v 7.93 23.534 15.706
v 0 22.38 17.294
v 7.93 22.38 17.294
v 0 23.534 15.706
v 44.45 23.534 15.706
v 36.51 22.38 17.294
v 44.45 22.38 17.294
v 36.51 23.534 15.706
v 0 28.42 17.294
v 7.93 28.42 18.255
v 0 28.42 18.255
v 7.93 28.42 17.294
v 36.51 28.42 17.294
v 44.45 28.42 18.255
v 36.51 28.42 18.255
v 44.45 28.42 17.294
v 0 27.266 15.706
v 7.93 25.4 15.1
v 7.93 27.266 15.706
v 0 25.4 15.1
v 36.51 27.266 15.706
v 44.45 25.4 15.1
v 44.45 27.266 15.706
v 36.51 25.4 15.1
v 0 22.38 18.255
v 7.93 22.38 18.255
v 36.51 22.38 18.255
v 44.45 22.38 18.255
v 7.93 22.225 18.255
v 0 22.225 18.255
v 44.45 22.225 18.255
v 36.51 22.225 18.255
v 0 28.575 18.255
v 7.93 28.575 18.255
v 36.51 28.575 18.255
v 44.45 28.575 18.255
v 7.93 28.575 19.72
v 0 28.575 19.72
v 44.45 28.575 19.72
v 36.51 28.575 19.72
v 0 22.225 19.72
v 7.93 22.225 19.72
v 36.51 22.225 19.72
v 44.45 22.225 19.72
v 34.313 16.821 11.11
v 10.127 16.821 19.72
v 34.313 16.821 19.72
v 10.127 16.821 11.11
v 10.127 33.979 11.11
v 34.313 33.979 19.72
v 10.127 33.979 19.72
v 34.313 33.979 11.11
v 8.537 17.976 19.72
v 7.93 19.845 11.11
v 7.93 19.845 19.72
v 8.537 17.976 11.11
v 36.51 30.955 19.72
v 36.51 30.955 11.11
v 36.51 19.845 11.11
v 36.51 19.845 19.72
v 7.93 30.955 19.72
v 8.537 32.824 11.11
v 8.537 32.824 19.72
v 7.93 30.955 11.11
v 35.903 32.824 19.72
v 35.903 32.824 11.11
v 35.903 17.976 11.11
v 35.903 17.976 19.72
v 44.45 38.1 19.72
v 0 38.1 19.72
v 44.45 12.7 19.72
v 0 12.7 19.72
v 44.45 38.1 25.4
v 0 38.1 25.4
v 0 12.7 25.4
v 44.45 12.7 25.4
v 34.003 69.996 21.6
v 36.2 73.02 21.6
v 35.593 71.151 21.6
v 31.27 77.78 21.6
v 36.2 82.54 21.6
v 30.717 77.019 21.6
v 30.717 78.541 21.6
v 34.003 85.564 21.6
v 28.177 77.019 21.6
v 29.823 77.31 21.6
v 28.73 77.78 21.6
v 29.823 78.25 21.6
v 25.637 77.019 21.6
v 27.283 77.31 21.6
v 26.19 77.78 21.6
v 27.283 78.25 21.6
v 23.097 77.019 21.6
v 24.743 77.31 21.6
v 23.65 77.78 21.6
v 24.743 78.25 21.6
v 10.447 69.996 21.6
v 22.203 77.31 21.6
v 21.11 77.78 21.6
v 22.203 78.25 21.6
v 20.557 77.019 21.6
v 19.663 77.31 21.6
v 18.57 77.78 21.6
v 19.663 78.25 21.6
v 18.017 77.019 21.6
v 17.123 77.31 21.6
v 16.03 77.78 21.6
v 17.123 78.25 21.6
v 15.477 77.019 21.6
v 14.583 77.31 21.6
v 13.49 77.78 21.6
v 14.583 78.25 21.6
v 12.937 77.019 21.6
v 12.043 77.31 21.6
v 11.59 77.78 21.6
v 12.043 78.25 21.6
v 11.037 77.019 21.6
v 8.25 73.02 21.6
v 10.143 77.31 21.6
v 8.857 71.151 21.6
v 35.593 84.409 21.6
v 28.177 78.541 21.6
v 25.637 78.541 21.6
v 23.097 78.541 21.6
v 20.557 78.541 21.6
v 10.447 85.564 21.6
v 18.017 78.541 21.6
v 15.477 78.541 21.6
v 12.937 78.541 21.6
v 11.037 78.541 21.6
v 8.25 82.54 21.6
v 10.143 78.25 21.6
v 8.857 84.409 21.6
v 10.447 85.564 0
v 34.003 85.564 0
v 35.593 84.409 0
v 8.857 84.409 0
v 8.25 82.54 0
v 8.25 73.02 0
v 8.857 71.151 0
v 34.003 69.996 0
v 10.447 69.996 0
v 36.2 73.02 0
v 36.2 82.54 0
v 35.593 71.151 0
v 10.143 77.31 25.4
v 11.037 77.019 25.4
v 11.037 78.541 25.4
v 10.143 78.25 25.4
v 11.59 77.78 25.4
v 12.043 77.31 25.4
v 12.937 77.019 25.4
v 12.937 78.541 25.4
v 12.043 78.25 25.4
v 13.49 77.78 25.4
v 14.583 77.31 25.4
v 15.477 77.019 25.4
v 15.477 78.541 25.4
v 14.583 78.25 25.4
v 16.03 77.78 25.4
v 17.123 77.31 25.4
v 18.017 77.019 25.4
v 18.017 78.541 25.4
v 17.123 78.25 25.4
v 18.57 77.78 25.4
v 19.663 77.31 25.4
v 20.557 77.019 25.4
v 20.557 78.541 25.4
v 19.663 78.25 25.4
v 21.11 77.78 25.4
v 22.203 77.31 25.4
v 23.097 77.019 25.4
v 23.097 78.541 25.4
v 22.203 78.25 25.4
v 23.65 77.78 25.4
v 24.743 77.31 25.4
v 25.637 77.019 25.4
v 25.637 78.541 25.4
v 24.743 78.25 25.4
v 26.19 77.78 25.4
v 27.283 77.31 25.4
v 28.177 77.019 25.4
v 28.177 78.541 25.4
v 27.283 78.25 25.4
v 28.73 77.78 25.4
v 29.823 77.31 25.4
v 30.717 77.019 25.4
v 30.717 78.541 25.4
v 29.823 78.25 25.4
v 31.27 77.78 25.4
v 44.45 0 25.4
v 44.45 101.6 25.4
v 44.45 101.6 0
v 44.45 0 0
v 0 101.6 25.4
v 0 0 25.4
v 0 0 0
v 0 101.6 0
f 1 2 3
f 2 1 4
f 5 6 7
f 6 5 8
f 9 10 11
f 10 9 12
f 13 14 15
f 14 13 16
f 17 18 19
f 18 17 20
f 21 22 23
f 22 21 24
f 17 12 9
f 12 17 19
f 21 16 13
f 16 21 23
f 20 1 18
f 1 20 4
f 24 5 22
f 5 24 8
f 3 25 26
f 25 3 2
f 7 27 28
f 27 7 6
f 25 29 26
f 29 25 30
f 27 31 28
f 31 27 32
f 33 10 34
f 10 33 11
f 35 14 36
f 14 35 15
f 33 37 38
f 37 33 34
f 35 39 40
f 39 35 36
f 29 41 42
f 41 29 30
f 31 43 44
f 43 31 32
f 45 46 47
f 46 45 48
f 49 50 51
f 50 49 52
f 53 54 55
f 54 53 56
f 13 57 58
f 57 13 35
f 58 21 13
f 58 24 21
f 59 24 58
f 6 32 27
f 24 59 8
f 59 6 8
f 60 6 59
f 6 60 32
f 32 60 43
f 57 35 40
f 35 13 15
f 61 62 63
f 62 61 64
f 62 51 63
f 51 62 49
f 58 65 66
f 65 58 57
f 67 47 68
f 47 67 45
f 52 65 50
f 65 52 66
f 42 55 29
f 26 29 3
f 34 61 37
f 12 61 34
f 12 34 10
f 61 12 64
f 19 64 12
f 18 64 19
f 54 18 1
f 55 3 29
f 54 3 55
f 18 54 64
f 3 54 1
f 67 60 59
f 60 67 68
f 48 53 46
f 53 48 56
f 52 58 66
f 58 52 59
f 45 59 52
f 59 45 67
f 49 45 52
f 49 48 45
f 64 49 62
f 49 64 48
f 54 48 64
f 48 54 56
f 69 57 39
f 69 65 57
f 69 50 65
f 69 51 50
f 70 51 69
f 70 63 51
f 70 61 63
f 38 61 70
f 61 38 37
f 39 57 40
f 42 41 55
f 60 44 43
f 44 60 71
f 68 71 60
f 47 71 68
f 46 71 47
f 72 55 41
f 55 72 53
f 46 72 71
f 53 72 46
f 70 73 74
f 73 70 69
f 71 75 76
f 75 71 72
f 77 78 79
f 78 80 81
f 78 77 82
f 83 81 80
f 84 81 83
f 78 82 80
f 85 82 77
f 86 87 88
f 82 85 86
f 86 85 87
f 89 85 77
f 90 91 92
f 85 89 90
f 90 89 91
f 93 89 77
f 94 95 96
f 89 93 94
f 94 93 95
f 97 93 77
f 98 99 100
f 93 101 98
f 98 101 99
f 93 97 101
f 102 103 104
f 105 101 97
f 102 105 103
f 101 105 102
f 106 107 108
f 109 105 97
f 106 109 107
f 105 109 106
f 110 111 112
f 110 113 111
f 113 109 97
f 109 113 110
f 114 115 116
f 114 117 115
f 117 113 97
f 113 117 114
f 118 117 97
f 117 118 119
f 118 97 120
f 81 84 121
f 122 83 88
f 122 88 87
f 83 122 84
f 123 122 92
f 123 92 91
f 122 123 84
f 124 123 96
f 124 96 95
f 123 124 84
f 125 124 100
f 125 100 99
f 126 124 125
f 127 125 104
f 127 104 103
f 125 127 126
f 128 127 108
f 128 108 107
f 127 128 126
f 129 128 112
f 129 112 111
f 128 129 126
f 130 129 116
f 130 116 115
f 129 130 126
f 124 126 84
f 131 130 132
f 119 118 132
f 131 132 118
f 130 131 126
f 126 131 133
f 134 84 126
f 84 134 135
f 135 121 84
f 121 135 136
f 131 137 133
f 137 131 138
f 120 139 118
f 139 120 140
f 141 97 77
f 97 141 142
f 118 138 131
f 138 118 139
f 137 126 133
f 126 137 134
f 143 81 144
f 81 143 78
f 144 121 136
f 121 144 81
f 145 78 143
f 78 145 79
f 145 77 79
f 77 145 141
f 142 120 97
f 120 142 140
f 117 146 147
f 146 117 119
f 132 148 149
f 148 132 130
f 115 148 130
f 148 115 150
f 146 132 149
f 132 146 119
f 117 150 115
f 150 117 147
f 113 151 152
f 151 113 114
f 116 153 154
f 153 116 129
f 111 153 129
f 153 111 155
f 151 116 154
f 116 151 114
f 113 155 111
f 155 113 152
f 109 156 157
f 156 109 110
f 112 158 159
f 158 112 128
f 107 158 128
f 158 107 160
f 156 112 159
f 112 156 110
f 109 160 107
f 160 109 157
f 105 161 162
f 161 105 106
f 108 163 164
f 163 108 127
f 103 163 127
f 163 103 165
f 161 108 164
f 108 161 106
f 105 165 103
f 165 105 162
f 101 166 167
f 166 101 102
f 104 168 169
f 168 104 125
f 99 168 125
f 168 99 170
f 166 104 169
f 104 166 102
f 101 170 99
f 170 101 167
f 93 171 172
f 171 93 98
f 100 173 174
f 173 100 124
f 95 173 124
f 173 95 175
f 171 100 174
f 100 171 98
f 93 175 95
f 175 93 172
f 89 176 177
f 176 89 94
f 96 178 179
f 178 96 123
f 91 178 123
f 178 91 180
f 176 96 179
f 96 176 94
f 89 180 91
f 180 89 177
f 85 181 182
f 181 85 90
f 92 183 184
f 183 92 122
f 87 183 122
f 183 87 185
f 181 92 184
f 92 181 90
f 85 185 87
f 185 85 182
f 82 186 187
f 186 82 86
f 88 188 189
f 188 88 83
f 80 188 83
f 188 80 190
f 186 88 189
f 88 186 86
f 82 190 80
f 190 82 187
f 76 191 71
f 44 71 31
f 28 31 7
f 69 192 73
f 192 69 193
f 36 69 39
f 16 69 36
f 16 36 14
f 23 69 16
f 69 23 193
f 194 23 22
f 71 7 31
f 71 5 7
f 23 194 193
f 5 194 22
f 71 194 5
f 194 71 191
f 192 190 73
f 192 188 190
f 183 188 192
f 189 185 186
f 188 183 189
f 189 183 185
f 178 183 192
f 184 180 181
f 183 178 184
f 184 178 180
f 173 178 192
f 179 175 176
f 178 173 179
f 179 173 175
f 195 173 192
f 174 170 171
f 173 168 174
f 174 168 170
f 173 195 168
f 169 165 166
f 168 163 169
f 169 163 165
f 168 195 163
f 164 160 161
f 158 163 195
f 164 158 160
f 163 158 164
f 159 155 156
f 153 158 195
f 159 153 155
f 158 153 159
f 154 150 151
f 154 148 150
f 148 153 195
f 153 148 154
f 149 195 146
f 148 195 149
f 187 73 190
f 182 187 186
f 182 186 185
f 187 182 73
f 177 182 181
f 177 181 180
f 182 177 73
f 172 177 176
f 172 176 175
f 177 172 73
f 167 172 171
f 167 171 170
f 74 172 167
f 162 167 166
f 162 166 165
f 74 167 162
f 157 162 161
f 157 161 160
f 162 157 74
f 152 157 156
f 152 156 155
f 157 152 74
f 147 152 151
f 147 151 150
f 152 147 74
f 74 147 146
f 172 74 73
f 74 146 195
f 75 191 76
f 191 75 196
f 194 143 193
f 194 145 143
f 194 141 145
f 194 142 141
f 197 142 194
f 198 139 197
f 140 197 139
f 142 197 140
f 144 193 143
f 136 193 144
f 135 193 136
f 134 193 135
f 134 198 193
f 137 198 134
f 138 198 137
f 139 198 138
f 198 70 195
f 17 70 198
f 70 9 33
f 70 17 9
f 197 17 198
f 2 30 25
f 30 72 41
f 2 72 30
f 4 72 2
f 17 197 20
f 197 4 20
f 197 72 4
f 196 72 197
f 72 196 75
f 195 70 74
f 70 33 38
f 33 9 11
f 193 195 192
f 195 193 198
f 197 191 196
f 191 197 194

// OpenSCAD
difference(){
    cube([44.45,101.6,25.4]);
    union(){
        translate([9.52+3.18/2,25.4-(14.29-3.18)/2,11.11]){
            minkowski(){
                cylinder(r=3.18,h=14.29);
                cube([25.4-3.18,14.29-3.18,14.29]);
            }
        }
        union(){
            translate([-.25,25.4,25.4-14.25/2])
            rotate([0,90,0])
            cylinder(r=6.35/2,h=45);
            translate([-.25,25.4-6.35/2,25.4-14.29/2])
            cube([45,6.35,14.29]);
        }
        translate([-.25,25.4-25.4/2,25.4-5.68])
        cube([45,25.4,14.29]);
    }
    translate([11.43,73.02,-1]){
        union(){
            minkowski(){
                    cylinder(r=3.18,h=11.3);
                    cube([27.94-6.35,12.7-3.18,11.3]);
            }
            translate([-0.64,4.76,0])cylinder(r=.8,h=27);
            translate([1.26,4.76,0])cylinder(r=.8,h=27);
            translate([3.8,4.76,0])cylinder(r=.8,h=27);
            translate([6.34,4.76,0])cylinder(r=.8,h=27);
            translate([8.88,4.76,0])cylinder(r=.8,h=27);
            translate([11.42,4.76,0])cylinder(r=.8,h=27);
            translate([13.96,4.76,0])cylinder(r=.8,h=27);
            translate([16.5,4.76,0])cylinder(r=.8,h=27);
            translate([19.04,4.76,0])cylinder(r=.8,h=27);
        }
    }
}
